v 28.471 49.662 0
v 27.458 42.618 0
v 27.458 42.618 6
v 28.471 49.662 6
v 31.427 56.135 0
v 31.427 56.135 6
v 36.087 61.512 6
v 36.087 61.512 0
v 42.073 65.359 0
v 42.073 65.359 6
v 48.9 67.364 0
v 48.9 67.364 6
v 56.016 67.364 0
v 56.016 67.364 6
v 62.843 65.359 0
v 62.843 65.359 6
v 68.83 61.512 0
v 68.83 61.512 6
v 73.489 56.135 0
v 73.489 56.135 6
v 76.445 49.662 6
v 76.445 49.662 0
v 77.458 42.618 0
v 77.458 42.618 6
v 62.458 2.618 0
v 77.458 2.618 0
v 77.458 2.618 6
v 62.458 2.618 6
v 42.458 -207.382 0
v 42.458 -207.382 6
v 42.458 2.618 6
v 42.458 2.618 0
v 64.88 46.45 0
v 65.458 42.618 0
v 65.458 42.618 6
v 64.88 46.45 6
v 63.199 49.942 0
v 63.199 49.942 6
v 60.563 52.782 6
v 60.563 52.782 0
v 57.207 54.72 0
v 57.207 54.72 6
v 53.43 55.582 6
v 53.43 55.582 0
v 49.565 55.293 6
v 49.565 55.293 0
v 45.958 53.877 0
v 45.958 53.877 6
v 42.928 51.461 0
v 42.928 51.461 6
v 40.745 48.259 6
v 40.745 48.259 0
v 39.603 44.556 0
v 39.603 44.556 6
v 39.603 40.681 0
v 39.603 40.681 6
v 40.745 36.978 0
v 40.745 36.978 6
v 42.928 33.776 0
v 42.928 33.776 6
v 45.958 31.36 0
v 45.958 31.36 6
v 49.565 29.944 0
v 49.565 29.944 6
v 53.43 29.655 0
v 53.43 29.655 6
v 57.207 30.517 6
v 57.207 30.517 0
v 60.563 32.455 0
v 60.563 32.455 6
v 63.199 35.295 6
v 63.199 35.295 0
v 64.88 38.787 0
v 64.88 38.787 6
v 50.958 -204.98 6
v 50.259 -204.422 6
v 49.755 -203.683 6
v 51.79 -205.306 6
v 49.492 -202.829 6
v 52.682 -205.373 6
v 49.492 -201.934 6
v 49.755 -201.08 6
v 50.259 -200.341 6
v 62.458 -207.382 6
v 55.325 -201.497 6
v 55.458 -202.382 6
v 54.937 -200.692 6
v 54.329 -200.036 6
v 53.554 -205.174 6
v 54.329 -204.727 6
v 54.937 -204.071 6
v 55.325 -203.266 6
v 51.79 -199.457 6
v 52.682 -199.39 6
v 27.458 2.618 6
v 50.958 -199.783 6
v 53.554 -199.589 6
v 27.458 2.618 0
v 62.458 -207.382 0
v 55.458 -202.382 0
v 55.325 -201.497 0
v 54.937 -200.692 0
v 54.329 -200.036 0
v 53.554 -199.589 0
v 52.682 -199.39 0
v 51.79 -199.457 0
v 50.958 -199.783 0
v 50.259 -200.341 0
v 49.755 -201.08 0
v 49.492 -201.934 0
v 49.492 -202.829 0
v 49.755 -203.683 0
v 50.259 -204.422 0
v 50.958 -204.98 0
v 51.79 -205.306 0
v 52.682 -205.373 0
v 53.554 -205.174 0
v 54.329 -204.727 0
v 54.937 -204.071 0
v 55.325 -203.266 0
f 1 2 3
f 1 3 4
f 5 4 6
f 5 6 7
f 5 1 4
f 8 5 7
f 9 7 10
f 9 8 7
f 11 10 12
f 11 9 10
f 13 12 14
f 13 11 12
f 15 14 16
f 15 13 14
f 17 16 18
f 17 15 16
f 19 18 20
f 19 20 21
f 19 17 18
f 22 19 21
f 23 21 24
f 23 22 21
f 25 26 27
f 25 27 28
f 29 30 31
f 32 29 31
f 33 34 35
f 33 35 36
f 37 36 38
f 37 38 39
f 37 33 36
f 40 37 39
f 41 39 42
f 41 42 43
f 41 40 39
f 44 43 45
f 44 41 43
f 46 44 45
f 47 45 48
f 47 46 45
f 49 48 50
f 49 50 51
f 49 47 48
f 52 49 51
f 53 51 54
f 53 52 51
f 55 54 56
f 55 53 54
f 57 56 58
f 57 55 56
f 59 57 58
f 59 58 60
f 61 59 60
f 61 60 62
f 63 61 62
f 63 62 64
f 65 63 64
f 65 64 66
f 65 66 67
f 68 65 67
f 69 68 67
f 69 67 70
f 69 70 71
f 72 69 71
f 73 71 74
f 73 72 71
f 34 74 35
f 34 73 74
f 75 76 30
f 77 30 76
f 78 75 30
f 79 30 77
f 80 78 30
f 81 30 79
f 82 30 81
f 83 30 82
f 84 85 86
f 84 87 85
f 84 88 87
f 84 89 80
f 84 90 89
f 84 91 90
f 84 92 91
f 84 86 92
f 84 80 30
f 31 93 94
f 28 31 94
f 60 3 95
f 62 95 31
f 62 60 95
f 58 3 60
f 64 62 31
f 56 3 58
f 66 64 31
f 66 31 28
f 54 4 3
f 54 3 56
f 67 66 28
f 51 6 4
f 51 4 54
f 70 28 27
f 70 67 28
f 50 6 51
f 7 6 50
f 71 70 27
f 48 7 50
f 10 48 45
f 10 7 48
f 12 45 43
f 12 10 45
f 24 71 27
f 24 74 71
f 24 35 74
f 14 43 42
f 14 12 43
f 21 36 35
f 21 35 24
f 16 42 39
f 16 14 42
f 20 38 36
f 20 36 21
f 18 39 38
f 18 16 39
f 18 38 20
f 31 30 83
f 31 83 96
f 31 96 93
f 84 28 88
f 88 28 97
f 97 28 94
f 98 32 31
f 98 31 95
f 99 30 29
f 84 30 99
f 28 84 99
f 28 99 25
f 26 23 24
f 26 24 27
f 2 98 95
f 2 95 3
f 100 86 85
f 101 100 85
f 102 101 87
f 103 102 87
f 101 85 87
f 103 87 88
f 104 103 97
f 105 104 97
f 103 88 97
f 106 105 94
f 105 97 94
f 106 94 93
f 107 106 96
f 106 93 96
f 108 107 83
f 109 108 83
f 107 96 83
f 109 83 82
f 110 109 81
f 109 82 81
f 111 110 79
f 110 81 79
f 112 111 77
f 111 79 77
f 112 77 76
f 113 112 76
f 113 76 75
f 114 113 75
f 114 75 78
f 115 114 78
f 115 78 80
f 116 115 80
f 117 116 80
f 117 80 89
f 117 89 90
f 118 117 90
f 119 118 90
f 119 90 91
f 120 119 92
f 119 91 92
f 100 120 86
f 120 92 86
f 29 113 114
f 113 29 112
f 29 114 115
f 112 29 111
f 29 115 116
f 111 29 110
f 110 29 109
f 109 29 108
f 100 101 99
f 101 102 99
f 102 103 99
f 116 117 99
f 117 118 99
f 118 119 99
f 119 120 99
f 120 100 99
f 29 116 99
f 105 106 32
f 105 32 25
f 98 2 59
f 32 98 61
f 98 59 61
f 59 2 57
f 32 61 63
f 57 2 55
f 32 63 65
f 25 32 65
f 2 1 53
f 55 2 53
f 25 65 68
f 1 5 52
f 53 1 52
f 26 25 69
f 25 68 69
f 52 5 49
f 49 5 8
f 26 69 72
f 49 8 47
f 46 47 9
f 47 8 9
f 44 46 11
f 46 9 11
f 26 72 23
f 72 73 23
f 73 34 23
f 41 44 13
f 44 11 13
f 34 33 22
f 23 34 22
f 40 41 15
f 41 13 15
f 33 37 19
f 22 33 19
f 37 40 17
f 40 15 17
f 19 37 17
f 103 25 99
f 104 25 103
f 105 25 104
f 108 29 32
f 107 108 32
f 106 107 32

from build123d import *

# Parameters (mm, degrees)
SKETCH1_R           = 13
BOSS_EXTRUDE3_DEPTH = 6
SKETCH3_W           = 20
SKETCH3_H           = 6
BOSS_EXTRUDE4_DEPTH = 200
SKETCH5_W           = 20
SKETCH5_H           = 10
SKETCH5_R           = 3
BOSS_EXTRUDE5_DEPTH = 6


with BuildPart() as part:
    # Sketch1 → Boss-Extrude3 (new body)
    with BuildSketch(Plane.XY):
        with BuildLine():
            Line((77.458052403, 42.618499055), (77.458052403, 2.618499055))
            Line((77.458052403, 2.618499055), (27.458052403, 2.618499055))
            Line((27.458052403, 2.618499055), (27.458052403, 42.618499055))
            ThreePointArc((27.458052403, 42.618499055), (52.458052403, 67.618499055), (77.458052403, 42.618499055))
        make_face()
        with Locations((52.458052403, 42.618499055)):
            Circle(SKETCH1_R, mode=Mode.SUBTRACT)
    extrude(amount=BOSS_EXTRUDE3_DEPTH)

    # Sketch3 → Boss-Extrude4 (add)
    with BuildSketch(Plane.XZ.offset(-2.618499055)):
        with Locations((52.458052403, 3)):
            Rectangle(SKETCH3_W, SKETCH3_H)
    extrude(amount=BOSS_EXTRUDE4_DEPTH)

    # Sketch5 → Boss-Extrude5 (add)
    with BuildSketch(Plane.XY.offset(6)):
        with Locations((52.458052403, -202.381500945)):
            Rectangle(SKETCH5_W, SKETCH5_H)
        with Locations((52.458052403, -202.381500945)):
            Circle(SKETCH5_R, mode=Mode.SUBTRACT)
    extrude(amount=-BOSS_EXTRUDE5_DEPTH)


solid = part.part
